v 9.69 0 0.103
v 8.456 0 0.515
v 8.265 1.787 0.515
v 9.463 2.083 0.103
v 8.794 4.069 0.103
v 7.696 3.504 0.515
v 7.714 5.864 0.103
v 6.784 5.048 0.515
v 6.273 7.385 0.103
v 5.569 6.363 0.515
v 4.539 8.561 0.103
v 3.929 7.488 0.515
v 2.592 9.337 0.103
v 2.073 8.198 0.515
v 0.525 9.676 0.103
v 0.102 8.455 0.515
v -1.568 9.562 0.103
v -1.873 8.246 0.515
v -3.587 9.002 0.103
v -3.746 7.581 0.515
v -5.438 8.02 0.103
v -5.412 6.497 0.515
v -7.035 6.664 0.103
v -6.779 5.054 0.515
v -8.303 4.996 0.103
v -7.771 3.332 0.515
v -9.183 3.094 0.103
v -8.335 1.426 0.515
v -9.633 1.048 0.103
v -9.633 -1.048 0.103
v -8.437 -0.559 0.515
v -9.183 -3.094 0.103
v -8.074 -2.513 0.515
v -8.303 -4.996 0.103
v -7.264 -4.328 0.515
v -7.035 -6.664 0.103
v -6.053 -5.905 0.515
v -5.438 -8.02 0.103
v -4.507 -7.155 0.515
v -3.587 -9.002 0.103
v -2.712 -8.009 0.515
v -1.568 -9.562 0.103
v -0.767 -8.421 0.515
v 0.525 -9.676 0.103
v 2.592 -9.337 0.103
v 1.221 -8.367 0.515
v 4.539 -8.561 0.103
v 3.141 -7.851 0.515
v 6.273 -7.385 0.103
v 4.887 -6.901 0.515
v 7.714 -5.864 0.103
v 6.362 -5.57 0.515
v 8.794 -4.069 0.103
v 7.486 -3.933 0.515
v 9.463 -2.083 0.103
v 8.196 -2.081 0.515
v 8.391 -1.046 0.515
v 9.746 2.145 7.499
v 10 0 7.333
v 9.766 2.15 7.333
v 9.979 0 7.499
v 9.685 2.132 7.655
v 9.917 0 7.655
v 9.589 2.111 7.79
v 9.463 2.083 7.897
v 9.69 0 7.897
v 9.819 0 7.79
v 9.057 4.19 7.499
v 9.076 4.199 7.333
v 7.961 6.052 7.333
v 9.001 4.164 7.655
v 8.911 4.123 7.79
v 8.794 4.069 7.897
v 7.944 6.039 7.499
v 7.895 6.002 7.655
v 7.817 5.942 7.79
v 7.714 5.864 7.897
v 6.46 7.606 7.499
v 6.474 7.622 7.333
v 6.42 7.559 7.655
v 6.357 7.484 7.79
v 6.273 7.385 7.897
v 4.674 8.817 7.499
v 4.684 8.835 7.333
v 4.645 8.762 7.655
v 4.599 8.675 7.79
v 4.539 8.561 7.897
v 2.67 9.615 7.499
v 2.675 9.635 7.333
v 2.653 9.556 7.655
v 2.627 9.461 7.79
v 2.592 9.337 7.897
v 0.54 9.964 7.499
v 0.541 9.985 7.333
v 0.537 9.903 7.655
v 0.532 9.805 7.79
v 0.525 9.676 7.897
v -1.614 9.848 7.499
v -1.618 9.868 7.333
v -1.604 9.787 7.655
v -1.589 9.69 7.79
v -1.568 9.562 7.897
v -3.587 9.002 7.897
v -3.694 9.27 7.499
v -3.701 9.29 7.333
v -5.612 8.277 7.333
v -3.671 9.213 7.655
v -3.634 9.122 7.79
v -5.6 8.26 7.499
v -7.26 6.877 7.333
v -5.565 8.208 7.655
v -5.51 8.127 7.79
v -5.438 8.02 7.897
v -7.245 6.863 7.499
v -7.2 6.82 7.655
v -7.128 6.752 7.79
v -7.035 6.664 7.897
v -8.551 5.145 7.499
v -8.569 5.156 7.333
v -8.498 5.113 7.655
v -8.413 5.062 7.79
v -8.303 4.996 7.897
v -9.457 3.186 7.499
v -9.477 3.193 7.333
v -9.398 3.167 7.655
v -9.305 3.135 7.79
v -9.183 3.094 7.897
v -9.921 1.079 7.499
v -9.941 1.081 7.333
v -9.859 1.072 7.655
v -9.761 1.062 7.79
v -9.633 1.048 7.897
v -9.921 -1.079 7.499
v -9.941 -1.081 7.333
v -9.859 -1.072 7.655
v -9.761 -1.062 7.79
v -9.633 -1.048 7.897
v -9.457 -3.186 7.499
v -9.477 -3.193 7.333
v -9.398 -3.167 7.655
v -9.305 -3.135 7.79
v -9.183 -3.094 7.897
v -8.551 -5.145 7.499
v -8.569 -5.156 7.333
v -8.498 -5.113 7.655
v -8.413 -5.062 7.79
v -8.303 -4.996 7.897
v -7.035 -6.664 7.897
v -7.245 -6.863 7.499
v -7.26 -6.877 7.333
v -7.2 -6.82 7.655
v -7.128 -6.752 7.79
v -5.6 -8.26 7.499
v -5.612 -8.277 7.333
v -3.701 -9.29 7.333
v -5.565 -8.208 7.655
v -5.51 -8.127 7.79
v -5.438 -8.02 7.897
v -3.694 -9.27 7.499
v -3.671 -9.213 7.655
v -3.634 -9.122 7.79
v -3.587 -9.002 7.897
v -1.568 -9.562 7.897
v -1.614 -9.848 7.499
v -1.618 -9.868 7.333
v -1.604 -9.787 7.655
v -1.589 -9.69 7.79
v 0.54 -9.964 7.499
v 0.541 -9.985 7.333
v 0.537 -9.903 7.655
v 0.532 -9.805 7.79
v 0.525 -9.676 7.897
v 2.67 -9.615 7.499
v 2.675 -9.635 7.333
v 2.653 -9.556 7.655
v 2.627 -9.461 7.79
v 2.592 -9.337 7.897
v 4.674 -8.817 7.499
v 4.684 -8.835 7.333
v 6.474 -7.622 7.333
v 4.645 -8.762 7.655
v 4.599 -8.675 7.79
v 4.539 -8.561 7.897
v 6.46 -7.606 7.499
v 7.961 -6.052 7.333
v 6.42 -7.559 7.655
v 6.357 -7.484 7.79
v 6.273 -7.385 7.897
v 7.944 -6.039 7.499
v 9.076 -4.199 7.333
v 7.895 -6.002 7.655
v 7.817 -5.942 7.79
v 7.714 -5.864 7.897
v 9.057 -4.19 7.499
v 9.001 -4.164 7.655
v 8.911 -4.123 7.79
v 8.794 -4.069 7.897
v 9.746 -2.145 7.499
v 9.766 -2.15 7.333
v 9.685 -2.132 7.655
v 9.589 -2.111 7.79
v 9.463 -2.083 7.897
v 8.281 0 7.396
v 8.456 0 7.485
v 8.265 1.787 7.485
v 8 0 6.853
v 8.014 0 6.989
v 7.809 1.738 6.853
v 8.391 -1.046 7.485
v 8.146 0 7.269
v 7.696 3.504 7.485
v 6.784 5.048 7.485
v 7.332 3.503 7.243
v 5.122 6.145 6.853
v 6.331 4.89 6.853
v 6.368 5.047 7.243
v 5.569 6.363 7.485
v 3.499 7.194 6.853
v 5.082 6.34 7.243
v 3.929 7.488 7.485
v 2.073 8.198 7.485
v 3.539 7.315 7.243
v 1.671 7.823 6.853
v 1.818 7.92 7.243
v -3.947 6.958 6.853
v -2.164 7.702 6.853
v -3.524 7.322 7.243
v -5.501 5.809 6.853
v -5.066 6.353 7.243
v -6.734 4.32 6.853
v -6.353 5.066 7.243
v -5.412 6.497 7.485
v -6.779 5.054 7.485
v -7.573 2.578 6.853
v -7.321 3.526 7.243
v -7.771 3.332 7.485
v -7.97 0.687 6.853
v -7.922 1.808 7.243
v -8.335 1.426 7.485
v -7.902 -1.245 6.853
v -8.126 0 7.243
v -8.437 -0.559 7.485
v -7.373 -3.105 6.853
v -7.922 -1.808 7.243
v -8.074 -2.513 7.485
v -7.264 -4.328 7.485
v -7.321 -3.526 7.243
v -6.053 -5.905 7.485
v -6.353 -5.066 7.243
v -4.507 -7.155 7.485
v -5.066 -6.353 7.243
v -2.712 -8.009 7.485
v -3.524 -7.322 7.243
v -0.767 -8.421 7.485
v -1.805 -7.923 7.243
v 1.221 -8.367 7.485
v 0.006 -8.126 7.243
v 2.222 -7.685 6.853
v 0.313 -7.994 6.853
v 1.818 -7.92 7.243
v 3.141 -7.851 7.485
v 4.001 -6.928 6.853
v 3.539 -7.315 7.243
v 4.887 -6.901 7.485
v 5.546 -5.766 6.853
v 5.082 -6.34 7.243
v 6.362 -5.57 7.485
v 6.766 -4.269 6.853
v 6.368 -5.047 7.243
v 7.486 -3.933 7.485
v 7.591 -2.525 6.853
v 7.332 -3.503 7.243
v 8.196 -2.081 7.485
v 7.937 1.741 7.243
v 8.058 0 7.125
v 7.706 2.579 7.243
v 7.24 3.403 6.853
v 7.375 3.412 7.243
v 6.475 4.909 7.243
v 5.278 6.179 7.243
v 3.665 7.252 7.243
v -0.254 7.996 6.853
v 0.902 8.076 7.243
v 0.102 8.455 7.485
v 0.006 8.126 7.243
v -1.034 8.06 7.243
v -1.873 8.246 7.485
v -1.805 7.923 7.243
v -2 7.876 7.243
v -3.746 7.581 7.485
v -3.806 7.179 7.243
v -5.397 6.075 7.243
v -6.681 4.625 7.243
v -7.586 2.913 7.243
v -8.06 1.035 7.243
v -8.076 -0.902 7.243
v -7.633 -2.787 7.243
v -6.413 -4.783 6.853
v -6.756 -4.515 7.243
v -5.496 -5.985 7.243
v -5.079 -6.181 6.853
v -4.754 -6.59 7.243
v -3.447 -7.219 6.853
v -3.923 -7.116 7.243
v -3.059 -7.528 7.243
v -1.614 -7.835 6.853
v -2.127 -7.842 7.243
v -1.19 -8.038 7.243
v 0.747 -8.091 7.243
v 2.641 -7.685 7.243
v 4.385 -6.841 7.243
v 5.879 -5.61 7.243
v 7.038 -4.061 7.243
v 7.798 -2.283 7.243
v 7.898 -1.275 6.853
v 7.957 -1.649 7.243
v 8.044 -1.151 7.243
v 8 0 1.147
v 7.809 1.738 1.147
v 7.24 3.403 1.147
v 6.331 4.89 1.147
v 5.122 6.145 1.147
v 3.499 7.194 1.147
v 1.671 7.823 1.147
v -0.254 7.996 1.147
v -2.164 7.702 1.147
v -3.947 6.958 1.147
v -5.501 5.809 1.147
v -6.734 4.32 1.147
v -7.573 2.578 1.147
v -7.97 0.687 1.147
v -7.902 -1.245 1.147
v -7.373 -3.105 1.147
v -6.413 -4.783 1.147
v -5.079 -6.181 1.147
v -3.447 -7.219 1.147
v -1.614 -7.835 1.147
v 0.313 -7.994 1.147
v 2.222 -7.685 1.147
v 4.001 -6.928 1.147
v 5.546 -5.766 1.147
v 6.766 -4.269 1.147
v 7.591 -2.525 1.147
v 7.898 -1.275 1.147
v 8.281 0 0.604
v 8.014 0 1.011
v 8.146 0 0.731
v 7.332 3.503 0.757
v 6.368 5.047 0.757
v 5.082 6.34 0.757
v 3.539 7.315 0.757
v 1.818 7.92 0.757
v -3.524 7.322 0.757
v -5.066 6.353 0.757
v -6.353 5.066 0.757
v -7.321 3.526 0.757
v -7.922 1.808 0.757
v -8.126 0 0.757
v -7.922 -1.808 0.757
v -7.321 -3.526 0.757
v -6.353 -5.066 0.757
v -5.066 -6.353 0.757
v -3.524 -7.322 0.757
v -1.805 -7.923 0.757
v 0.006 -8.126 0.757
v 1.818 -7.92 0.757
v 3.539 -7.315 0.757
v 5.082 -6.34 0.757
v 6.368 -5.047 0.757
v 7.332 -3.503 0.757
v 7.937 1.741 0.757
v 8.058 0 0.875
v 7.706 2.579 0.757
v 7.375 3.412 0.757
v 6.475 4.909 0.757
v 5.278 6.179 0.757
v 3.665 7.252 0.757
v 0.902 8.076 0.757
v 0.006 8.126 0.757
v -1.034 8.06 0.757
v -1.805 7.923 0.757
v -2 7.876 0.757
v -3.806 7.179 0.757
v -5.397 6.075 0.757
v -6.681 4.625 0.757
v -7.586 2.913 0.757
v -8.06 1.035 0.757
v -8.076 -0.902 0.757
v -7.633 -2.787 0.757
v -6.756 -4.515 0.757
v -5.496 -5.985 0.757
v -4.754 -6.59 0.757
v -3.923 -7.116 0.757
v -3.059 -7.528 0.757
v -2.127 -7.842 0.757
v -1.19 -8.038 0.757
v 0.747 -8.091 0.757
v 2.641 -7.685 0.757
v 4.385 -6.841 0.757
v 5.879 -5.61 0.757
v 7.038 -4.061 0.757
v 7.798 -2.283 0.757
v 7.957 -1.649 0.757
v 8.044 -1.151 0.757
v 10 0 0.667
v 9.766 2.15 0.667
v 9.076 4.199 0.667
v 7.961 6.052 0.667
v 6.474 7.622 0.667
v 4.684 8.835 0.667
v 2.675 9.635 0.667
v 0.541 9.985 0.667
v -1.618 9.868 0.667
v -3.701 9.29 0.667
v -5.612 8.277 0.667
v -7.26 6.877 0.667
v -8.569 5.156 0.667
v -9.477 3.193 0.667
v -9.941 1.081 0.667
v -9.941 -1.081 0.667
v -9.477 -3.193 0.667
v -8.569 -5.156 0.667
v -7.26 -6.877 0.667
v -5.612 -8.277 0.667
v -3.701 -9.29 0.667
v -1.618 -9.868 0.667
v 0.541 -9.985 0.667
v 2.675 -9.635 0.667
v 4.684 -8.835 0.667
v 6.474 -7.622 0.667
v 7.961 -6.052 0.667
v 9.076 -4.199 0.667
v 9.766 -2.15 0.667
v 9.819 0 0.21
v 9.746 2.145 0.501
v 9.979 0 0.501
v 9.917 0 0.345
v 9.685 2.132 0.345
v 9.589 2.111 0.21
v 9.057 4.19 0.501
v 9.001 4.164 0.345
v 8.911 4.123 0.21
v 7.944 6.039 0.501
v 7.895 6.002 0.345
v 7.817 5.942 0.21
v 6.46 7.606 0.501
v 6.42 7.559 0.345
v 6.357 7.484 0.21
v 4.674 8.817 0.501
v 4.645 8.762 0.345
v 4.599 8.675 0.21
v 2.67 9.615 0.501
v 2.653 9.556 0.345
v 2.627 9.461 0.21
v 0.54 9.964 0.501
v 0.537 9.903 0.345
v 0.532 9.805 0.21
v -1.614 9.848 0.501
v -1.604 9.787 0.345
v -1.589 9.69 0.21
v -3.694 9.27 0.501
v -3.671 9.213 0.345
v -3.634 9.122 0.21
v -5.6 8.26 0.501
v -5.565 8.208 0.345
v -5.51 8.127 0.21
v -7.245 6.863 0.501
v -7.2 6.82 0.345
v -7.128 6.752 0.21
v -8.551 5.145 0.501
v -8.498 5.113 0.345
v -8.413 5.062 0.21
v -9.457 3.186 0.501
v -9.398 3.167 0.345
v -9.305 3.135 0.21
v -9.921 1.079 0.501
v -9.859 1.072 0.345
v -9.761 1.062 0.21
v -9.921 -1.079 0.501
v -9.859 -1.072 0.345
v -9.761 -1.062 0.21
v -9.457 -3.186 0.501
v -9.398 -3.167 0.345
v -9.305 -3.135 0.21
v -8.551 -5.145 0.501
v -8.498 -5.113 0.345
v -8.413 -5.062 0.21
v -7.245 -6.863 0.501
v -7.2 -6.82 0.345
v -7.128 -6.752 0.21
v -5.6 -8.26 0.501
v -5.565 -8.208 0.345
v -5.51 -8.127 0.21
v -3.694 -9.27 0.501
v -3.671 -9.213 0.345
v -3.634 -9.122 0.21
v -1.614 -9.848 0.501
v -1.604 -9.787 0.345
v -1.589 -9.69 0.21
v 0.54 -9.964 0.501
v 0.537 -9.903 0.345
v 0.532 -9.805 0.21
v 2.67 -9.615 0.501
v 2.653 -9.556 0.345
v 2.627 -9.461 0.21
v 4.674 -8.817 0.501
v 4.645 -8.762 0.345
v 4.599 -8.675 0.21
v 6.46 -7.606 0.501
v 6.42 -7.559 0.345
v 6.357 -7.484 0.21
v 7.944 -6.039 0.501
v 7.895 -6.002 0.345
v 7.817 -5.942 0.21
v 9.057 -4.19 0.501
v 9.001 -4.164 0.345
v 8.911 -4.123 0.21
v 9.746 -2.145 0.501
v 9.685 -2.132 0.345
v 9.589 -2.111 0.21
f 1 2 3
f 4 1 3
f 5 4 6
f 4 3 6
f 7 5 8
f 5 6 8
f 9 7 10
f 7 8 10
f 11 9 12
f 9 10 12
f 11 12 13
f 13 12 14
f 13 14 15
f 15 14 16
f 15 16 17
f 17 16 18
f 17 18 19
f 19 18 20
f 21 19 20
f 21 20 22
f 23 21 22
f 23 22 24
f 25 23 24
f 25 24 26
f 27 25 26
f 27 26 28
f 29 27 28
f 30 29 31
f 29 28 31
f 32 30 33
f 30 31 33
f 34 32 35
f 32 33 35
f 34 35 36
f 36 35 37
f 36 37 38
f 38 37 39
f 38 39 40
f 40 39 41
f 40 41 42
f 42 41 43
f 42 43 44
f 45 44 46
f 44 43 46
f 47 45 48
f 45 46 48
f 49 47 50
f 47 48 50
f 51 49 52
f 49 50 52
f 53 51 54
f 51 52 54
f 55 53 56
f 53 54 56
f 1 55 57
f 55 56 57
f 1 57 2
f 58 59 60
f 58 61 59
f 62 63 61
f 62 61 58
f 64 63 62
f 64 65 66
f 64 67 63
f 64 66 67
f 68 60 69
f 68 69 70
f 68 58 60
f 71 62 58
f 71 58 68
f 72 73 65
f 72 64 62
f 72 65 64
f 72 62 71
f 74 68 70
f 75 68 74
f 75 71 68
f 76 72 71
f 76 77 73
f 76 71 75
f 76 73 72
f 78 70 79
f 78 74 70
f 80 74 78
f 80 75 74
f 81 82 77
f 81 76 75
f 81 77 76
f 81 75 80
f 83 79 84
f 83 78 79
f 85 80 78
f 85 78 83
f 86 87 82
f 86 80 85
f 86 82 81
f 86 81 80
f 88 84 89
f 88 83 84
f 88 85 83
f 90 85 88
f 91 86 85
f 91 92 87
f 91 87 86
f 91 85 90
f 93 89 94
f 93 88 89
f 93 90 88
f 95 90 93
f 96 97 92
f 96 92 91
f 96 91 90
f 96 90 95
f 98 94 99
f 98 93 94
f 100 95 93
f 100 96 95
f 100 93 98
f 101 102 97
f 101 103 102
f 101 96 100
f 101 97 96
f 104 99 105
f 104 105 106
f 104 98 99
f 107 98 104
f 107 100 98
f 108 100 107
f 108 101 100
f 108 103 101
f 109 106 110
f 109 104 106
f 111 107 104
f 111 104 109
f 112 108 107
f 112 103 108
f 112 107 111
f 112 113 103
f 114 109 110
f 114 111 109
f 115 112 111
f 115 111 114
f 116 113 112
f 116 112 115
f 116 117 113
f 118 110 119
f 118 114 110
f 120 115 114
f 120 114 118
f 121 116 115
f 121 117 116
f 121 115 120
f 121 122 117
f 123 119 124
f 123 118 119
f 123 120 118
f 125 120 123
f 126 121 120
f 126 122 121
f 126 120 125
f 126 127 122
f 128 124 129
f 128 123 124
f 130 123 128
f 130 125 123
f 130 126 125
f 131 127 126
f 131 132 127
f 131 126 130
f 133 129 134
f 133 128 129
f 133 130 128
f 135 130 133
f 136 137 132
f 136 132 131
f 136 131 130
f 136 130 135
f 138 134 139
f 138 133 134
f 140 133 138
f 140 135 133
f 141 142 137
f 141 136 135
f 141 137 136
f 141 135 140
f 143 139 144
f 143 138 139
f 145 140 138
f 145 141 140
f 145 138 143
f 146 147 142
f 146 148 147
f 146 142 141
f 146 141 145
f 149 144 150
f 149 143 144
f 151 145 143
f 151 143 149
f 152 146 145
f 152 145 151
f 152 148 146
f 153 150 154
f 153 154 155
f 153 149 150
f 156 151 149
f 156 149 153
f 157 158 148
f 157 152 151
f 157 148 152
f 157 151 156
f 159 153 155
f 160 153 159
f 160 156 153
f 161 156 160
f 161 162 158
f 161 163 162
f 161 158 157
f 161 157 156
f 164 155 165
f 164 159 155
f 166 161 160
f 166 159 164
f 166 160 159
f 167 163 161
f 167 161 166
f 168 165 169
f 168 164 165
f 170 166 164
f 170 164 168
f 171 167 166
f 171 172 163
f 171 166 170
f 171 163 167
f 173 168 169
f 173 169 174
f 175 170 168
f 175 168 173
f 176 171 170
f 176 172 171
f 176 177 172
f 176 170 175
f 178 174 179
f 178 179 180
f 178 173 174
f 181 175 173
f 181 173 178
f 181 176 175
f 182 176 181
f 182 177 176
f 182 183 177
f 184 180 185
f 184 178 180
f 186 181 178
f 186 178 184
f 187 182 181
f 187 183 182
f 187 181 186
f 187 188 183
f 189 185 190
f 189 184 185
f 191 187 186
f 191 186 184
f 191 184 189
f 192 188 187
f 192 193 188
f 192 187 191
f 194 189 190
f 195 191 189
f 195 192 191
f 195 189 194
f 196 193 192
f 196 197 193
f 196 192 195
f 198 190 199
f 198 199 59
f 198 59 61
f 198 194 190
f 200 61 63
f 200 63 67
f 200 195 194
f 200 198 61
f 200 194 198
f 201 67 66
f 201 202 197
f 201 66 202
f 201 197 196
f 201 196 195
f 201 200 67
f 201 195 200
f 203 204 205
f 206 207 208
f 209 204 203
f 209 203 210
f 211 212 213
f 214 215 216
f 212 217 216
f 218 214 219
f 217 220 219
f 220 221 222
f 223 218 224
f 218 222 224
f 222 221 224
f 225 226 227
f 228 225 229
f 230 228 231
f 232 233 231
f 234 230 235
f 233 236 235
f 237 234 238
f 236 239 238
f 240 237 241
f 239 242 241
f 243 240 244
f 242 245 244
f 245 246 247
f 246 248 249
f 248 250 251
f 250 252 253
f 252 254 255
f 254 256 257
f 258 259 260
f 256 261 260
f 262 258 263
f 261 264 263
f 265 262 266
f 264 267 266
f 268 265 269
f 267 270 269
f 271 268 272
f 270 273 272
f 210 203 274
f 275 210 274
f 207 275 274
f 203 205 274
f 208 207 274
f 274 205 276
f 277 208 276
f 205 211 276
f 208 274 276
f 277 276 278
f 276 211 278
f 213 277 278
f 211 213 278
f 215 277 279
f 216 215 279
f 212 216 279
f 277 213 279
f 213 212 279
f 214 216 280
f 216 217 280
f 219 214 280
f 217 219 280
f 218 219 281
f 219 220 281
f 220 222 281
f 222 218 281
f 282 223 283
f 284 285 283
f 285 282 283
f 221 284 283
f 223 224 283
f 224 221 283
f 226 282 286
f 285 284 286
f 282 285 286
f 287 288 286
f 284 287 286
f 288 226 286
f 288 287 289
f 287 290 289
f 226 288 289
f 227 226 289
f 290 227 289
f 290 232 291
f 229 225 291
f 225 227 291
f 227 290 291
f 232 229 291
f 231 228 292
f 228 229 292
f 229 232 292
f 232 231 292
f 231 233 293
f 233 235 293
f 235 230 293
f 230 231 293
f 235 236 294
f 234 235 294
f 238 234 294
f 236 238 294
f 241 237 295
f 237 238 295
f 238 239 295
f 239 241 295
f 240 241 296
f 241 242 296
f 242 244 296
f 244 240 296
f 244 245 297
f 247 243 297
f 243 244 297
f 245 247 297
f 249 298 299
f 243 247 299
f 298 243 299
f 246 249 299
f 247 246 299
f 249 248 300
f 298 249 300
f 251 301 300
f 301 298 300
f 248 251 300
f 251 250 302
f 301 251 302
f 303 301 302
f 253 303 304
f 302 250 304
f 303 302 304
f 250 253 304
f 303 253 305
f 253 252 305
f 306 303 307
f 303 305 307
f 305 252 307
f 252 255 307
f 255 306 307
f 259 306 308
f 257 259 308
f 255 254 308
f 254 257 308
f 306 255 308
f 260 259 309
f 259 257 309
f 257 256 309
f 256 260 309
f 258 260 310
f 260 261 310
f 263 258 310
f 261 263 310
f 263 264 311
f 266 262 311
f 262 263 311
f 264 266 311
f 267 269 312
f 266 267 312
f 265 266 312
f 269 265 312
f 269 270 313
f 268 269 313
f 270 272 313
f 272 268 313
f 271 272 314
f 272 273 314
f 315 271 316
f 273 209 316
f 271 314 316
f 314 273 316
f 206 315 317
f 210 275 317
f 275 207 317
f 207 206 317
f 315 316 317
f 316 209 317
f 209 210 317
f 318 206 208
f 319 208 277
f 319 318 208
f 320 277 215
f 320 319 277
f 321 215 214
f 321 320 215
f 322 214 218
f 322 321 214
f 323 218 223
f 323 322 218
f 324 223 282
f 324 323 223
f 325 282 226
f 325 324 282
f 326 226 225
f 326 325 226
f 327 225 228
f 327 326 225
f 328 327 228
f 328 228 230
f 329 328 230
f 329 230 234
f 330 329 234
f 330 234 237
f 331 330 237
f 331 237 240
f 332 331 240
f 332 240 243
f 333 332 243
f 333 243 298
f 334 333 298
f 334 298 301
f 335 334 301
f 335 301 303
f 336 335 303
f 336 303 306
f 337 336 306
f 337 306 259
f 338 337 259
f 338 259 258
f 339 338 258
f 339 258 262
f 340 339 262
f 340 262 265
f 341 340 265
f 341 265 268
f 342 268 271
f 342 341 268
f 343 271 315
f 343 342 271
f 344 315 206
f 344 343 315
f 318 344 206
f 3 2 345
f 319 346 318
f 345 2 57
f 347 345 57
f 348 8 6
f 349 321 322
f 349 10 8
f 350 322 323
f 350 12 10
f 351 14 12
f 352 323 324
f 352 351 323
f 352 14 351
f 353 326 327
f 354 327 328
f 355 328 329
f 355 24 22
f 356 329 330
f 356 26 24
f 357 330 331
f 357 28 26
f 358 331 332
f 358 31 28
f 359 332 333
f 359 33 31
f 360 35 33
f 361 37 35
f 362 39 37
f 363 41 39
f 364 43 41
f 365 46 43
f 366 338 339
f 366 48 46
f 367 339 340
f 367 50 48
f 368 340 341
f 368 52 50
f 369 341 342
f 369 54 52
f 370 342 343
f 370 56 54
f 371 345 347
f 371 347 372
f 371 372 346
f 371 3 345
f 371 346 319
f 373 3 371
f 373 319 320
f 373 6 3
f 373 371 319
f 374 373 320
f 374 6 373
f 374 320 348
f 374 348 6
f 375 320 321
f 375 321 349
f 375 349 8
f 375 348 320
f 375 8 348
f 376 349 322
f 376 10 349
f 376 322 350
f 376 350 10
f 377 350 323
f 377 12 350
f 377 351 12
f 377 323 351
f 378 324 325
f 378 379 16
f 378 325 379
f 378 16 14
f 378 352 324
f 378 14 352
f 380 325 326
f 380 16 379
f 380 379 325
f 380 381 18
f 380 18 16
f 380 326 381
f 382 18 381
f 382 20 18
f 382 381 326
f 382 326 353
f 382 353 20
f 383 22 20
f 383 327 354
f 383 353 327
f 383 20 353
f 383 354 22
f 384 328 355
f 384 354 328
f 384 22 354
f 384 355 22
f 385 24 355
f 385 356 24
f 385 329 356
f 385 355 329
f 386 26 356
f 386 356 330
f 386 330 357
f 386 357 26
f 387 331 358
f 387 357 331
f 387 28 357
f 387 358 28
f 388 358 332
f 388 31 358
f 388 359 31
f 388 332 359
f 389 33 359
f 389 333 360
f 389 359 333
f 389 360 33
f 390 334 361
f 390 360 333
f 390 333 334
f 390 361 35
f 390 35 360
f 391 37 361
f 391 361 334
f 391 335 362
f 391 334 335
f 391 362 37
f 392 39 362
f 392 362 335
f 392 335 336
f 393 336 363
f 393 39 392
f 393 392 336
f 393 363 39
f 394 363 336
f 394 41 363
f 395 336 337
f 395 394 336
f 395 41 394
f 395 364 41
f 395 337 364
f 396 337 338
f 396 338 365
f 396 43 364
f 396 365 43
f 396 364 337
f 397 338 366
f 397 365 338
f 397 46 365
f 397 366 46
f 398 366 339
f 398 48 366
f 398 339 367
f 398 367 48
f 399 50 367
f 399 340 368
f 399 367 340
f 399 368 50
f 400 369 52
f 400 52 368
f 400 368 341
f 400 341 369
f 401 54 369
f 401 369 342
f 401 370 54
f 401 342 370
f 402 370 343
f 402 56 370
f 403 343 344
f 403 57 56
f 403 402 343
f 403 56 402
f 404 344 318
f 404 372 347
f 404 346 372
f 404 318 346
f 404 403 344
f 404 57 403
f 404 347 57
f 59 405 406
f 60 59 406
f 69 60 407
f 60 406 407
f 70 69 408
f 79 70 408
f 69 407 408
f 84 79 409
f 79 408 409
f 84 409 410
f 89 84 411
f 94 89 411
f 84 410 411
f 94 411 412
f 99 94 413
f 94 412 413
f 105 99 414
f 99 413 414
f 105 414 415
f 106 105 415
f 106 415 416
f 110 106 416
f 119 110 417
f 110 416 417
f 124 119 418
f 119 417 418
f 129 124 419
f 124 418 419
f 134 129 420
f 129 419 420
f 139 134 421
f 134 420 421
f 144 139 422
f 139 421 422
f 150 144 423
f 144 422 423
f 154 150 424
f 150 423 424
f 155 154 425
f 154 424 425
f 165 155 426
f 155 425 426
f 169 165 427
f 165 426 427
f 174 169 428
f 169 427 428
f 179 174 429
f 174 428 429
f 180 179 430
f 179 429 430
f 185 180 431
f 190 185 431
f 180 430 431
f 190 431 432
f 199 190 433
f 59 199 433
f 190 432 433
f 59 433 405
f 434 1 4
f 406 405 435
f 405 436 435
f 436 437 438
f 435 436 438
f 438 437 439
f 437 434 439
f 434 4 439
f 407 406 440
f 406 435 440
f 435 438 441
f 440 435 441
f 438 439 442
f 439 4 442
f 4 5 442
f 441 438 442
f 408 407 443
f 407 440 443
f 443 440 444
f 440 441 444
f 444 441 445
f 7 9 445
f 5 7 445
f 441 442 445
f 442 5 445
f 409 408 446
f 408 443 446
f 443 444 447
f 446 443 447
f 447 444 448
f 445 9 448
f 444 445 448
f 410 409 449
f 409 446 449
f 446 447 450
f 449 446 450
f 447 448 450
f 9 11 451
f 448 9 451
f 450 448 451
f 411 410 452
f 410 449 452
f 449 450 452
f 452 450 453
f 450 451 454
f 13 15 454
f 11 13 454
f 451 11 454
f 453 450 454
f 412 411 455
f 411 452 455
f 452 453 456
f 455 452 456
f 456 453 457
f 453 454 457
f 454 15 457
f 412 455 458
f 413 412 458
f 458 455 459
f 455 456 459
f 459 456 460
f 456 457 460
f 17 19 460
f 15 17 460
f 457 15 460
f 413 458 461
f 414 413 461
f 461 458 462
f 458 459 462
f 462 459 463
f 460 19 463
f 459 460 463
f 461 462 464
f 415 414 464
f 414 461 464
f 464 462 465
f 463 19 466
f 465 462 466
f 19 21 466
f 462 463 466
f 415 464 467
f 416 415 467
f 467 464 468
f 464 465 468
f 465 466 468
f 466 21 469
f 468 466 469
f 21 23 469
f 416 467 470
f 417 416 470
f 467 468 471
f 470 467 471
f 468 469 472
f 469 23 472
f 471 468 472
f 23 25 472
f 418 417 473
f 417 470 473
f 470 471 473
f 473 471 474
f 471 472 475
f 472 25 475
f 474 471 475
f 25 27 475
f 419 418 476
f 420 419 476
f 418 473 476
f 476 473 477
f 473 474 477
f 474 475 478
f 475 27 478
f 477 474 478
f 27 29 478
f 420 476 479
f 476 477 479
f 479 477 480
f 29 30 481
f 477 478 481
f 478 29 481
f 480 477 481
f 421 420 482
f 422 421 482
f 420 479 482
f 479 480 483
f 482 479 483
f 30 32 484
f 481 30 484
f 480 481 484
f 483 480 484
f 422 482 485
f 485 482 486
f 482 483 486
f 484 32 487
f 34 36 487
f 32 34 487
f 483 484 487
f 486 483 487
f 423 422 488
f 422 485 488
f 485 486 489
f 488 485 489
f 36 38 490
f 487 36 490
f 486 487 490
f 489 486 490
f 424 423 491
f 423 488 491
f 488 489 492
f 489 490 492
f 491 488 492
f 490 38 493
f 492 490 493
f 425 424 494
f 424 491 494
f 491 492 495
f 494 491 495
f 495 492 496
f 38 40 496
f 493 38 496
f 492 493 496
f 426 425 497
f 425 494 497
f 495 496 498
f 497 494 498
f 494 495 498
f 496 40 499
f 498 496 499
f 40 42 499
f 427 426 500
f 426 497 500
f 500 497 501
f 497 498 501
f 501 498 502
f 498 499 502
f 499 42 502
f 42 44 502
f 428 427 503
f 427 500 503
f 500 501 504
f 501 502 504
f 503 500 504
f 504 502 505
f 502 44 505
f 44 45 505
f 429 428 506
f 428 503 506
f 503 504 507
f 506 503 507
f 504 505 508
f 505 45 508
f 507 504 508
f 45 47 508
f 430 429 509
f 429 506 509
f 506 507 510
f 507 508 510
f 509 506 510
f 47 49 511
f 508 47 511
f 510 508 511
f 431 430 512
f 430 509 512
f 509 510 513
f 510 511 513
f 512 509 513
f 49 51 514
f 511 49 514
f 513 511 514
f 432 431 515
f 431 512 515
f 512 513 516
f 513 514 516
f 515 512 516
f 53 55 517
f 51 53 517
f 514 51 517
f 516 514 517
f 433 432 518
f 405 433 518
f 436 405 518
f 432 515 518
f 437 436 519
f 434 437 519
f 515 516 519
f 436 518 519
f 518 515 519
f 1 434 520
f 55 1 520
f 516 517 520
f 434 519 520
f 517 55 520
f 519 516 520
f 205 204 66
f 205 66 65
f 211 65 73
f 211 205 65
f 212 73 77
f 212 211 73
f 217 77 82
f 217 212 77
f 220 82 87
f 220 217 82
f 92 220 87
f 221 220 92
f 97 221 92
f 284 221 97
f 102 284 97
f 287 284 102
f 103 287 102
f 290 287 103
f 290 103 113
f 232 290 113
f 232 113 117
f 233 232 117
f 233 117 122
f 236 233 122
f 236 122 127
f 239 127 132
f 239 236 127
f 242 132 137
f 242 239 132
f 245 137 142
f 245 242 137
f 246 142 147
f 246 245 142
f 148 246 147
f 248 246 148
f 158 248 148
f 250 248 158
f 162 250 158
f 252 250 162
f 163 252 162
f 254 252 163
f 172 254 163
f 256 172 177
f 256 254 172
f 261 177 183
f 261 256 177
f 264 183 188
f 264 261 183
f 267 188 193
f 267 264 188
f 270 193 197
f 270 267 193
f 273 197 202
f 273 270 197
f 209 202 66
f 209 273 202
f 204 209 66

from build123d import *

# Parameters (mm, degrees)
F2_R     = 10
F2_R_2   = 8
F3_DEPTH = 8
F4_R     = 0.6666666667
F6_R     = 0.6666666667


# Not quite as in the source:
# - a fillet or chamfer that OpenCascade refuses, or shapes differently, is made with other operations: its cross-section is extruded or revolved along the edge and cut away or added


with BuildPart() as f3:
    # F2 (on Top) → F3 (new body)
    with BuildSketch(Plane.XY):
        Circle(F2_R)
        Circle(F2_R_2, mode=Mode.SUBTRACT)
    extrude(amount=F3_DEPTH)

    # F4
    f4_edges = [f3.edges().sort_by_distance(p)[0] for p in [
        (-10, 0, 8),
        (-10, 0, 0),
    ]]
    fillet(f4_edges, radius=F4_R)

    # F5: chamfer of 2 x 0.6666666667 on 2 edges, made by hand

    # F5_s1 → F5_t2 (revolve, cut)
    with BuildSketch(Plane.XZ):
        Polygon((10, 0), (8, 0.6666666667), (8, 0), align=None)
    revolve(axis=Axis((0, 0, 0), (0, 0, 1)), mode=Mode.SUBTRACT)

    # F5_s3 → F5_t4 (revolve, cut)
    with BuildSketch(Plane.XZ):
        Polygon((10, 8), (8, 7.3333333333), (8, 8), align=None)
    revolve(axis=Axis((0, 0, 8), (0, 0, 1)), mode=Mode.SUBTRACT)

    # F6
    f6_edges = [f3.edges().sort_by_distance(p)[0] for p in [
        (-8, 0, 7.333333),
        (-8, 0, 0.666667),
    ]]
    fillet(f6_edges, radius=F6_R)


solid = f3.part
